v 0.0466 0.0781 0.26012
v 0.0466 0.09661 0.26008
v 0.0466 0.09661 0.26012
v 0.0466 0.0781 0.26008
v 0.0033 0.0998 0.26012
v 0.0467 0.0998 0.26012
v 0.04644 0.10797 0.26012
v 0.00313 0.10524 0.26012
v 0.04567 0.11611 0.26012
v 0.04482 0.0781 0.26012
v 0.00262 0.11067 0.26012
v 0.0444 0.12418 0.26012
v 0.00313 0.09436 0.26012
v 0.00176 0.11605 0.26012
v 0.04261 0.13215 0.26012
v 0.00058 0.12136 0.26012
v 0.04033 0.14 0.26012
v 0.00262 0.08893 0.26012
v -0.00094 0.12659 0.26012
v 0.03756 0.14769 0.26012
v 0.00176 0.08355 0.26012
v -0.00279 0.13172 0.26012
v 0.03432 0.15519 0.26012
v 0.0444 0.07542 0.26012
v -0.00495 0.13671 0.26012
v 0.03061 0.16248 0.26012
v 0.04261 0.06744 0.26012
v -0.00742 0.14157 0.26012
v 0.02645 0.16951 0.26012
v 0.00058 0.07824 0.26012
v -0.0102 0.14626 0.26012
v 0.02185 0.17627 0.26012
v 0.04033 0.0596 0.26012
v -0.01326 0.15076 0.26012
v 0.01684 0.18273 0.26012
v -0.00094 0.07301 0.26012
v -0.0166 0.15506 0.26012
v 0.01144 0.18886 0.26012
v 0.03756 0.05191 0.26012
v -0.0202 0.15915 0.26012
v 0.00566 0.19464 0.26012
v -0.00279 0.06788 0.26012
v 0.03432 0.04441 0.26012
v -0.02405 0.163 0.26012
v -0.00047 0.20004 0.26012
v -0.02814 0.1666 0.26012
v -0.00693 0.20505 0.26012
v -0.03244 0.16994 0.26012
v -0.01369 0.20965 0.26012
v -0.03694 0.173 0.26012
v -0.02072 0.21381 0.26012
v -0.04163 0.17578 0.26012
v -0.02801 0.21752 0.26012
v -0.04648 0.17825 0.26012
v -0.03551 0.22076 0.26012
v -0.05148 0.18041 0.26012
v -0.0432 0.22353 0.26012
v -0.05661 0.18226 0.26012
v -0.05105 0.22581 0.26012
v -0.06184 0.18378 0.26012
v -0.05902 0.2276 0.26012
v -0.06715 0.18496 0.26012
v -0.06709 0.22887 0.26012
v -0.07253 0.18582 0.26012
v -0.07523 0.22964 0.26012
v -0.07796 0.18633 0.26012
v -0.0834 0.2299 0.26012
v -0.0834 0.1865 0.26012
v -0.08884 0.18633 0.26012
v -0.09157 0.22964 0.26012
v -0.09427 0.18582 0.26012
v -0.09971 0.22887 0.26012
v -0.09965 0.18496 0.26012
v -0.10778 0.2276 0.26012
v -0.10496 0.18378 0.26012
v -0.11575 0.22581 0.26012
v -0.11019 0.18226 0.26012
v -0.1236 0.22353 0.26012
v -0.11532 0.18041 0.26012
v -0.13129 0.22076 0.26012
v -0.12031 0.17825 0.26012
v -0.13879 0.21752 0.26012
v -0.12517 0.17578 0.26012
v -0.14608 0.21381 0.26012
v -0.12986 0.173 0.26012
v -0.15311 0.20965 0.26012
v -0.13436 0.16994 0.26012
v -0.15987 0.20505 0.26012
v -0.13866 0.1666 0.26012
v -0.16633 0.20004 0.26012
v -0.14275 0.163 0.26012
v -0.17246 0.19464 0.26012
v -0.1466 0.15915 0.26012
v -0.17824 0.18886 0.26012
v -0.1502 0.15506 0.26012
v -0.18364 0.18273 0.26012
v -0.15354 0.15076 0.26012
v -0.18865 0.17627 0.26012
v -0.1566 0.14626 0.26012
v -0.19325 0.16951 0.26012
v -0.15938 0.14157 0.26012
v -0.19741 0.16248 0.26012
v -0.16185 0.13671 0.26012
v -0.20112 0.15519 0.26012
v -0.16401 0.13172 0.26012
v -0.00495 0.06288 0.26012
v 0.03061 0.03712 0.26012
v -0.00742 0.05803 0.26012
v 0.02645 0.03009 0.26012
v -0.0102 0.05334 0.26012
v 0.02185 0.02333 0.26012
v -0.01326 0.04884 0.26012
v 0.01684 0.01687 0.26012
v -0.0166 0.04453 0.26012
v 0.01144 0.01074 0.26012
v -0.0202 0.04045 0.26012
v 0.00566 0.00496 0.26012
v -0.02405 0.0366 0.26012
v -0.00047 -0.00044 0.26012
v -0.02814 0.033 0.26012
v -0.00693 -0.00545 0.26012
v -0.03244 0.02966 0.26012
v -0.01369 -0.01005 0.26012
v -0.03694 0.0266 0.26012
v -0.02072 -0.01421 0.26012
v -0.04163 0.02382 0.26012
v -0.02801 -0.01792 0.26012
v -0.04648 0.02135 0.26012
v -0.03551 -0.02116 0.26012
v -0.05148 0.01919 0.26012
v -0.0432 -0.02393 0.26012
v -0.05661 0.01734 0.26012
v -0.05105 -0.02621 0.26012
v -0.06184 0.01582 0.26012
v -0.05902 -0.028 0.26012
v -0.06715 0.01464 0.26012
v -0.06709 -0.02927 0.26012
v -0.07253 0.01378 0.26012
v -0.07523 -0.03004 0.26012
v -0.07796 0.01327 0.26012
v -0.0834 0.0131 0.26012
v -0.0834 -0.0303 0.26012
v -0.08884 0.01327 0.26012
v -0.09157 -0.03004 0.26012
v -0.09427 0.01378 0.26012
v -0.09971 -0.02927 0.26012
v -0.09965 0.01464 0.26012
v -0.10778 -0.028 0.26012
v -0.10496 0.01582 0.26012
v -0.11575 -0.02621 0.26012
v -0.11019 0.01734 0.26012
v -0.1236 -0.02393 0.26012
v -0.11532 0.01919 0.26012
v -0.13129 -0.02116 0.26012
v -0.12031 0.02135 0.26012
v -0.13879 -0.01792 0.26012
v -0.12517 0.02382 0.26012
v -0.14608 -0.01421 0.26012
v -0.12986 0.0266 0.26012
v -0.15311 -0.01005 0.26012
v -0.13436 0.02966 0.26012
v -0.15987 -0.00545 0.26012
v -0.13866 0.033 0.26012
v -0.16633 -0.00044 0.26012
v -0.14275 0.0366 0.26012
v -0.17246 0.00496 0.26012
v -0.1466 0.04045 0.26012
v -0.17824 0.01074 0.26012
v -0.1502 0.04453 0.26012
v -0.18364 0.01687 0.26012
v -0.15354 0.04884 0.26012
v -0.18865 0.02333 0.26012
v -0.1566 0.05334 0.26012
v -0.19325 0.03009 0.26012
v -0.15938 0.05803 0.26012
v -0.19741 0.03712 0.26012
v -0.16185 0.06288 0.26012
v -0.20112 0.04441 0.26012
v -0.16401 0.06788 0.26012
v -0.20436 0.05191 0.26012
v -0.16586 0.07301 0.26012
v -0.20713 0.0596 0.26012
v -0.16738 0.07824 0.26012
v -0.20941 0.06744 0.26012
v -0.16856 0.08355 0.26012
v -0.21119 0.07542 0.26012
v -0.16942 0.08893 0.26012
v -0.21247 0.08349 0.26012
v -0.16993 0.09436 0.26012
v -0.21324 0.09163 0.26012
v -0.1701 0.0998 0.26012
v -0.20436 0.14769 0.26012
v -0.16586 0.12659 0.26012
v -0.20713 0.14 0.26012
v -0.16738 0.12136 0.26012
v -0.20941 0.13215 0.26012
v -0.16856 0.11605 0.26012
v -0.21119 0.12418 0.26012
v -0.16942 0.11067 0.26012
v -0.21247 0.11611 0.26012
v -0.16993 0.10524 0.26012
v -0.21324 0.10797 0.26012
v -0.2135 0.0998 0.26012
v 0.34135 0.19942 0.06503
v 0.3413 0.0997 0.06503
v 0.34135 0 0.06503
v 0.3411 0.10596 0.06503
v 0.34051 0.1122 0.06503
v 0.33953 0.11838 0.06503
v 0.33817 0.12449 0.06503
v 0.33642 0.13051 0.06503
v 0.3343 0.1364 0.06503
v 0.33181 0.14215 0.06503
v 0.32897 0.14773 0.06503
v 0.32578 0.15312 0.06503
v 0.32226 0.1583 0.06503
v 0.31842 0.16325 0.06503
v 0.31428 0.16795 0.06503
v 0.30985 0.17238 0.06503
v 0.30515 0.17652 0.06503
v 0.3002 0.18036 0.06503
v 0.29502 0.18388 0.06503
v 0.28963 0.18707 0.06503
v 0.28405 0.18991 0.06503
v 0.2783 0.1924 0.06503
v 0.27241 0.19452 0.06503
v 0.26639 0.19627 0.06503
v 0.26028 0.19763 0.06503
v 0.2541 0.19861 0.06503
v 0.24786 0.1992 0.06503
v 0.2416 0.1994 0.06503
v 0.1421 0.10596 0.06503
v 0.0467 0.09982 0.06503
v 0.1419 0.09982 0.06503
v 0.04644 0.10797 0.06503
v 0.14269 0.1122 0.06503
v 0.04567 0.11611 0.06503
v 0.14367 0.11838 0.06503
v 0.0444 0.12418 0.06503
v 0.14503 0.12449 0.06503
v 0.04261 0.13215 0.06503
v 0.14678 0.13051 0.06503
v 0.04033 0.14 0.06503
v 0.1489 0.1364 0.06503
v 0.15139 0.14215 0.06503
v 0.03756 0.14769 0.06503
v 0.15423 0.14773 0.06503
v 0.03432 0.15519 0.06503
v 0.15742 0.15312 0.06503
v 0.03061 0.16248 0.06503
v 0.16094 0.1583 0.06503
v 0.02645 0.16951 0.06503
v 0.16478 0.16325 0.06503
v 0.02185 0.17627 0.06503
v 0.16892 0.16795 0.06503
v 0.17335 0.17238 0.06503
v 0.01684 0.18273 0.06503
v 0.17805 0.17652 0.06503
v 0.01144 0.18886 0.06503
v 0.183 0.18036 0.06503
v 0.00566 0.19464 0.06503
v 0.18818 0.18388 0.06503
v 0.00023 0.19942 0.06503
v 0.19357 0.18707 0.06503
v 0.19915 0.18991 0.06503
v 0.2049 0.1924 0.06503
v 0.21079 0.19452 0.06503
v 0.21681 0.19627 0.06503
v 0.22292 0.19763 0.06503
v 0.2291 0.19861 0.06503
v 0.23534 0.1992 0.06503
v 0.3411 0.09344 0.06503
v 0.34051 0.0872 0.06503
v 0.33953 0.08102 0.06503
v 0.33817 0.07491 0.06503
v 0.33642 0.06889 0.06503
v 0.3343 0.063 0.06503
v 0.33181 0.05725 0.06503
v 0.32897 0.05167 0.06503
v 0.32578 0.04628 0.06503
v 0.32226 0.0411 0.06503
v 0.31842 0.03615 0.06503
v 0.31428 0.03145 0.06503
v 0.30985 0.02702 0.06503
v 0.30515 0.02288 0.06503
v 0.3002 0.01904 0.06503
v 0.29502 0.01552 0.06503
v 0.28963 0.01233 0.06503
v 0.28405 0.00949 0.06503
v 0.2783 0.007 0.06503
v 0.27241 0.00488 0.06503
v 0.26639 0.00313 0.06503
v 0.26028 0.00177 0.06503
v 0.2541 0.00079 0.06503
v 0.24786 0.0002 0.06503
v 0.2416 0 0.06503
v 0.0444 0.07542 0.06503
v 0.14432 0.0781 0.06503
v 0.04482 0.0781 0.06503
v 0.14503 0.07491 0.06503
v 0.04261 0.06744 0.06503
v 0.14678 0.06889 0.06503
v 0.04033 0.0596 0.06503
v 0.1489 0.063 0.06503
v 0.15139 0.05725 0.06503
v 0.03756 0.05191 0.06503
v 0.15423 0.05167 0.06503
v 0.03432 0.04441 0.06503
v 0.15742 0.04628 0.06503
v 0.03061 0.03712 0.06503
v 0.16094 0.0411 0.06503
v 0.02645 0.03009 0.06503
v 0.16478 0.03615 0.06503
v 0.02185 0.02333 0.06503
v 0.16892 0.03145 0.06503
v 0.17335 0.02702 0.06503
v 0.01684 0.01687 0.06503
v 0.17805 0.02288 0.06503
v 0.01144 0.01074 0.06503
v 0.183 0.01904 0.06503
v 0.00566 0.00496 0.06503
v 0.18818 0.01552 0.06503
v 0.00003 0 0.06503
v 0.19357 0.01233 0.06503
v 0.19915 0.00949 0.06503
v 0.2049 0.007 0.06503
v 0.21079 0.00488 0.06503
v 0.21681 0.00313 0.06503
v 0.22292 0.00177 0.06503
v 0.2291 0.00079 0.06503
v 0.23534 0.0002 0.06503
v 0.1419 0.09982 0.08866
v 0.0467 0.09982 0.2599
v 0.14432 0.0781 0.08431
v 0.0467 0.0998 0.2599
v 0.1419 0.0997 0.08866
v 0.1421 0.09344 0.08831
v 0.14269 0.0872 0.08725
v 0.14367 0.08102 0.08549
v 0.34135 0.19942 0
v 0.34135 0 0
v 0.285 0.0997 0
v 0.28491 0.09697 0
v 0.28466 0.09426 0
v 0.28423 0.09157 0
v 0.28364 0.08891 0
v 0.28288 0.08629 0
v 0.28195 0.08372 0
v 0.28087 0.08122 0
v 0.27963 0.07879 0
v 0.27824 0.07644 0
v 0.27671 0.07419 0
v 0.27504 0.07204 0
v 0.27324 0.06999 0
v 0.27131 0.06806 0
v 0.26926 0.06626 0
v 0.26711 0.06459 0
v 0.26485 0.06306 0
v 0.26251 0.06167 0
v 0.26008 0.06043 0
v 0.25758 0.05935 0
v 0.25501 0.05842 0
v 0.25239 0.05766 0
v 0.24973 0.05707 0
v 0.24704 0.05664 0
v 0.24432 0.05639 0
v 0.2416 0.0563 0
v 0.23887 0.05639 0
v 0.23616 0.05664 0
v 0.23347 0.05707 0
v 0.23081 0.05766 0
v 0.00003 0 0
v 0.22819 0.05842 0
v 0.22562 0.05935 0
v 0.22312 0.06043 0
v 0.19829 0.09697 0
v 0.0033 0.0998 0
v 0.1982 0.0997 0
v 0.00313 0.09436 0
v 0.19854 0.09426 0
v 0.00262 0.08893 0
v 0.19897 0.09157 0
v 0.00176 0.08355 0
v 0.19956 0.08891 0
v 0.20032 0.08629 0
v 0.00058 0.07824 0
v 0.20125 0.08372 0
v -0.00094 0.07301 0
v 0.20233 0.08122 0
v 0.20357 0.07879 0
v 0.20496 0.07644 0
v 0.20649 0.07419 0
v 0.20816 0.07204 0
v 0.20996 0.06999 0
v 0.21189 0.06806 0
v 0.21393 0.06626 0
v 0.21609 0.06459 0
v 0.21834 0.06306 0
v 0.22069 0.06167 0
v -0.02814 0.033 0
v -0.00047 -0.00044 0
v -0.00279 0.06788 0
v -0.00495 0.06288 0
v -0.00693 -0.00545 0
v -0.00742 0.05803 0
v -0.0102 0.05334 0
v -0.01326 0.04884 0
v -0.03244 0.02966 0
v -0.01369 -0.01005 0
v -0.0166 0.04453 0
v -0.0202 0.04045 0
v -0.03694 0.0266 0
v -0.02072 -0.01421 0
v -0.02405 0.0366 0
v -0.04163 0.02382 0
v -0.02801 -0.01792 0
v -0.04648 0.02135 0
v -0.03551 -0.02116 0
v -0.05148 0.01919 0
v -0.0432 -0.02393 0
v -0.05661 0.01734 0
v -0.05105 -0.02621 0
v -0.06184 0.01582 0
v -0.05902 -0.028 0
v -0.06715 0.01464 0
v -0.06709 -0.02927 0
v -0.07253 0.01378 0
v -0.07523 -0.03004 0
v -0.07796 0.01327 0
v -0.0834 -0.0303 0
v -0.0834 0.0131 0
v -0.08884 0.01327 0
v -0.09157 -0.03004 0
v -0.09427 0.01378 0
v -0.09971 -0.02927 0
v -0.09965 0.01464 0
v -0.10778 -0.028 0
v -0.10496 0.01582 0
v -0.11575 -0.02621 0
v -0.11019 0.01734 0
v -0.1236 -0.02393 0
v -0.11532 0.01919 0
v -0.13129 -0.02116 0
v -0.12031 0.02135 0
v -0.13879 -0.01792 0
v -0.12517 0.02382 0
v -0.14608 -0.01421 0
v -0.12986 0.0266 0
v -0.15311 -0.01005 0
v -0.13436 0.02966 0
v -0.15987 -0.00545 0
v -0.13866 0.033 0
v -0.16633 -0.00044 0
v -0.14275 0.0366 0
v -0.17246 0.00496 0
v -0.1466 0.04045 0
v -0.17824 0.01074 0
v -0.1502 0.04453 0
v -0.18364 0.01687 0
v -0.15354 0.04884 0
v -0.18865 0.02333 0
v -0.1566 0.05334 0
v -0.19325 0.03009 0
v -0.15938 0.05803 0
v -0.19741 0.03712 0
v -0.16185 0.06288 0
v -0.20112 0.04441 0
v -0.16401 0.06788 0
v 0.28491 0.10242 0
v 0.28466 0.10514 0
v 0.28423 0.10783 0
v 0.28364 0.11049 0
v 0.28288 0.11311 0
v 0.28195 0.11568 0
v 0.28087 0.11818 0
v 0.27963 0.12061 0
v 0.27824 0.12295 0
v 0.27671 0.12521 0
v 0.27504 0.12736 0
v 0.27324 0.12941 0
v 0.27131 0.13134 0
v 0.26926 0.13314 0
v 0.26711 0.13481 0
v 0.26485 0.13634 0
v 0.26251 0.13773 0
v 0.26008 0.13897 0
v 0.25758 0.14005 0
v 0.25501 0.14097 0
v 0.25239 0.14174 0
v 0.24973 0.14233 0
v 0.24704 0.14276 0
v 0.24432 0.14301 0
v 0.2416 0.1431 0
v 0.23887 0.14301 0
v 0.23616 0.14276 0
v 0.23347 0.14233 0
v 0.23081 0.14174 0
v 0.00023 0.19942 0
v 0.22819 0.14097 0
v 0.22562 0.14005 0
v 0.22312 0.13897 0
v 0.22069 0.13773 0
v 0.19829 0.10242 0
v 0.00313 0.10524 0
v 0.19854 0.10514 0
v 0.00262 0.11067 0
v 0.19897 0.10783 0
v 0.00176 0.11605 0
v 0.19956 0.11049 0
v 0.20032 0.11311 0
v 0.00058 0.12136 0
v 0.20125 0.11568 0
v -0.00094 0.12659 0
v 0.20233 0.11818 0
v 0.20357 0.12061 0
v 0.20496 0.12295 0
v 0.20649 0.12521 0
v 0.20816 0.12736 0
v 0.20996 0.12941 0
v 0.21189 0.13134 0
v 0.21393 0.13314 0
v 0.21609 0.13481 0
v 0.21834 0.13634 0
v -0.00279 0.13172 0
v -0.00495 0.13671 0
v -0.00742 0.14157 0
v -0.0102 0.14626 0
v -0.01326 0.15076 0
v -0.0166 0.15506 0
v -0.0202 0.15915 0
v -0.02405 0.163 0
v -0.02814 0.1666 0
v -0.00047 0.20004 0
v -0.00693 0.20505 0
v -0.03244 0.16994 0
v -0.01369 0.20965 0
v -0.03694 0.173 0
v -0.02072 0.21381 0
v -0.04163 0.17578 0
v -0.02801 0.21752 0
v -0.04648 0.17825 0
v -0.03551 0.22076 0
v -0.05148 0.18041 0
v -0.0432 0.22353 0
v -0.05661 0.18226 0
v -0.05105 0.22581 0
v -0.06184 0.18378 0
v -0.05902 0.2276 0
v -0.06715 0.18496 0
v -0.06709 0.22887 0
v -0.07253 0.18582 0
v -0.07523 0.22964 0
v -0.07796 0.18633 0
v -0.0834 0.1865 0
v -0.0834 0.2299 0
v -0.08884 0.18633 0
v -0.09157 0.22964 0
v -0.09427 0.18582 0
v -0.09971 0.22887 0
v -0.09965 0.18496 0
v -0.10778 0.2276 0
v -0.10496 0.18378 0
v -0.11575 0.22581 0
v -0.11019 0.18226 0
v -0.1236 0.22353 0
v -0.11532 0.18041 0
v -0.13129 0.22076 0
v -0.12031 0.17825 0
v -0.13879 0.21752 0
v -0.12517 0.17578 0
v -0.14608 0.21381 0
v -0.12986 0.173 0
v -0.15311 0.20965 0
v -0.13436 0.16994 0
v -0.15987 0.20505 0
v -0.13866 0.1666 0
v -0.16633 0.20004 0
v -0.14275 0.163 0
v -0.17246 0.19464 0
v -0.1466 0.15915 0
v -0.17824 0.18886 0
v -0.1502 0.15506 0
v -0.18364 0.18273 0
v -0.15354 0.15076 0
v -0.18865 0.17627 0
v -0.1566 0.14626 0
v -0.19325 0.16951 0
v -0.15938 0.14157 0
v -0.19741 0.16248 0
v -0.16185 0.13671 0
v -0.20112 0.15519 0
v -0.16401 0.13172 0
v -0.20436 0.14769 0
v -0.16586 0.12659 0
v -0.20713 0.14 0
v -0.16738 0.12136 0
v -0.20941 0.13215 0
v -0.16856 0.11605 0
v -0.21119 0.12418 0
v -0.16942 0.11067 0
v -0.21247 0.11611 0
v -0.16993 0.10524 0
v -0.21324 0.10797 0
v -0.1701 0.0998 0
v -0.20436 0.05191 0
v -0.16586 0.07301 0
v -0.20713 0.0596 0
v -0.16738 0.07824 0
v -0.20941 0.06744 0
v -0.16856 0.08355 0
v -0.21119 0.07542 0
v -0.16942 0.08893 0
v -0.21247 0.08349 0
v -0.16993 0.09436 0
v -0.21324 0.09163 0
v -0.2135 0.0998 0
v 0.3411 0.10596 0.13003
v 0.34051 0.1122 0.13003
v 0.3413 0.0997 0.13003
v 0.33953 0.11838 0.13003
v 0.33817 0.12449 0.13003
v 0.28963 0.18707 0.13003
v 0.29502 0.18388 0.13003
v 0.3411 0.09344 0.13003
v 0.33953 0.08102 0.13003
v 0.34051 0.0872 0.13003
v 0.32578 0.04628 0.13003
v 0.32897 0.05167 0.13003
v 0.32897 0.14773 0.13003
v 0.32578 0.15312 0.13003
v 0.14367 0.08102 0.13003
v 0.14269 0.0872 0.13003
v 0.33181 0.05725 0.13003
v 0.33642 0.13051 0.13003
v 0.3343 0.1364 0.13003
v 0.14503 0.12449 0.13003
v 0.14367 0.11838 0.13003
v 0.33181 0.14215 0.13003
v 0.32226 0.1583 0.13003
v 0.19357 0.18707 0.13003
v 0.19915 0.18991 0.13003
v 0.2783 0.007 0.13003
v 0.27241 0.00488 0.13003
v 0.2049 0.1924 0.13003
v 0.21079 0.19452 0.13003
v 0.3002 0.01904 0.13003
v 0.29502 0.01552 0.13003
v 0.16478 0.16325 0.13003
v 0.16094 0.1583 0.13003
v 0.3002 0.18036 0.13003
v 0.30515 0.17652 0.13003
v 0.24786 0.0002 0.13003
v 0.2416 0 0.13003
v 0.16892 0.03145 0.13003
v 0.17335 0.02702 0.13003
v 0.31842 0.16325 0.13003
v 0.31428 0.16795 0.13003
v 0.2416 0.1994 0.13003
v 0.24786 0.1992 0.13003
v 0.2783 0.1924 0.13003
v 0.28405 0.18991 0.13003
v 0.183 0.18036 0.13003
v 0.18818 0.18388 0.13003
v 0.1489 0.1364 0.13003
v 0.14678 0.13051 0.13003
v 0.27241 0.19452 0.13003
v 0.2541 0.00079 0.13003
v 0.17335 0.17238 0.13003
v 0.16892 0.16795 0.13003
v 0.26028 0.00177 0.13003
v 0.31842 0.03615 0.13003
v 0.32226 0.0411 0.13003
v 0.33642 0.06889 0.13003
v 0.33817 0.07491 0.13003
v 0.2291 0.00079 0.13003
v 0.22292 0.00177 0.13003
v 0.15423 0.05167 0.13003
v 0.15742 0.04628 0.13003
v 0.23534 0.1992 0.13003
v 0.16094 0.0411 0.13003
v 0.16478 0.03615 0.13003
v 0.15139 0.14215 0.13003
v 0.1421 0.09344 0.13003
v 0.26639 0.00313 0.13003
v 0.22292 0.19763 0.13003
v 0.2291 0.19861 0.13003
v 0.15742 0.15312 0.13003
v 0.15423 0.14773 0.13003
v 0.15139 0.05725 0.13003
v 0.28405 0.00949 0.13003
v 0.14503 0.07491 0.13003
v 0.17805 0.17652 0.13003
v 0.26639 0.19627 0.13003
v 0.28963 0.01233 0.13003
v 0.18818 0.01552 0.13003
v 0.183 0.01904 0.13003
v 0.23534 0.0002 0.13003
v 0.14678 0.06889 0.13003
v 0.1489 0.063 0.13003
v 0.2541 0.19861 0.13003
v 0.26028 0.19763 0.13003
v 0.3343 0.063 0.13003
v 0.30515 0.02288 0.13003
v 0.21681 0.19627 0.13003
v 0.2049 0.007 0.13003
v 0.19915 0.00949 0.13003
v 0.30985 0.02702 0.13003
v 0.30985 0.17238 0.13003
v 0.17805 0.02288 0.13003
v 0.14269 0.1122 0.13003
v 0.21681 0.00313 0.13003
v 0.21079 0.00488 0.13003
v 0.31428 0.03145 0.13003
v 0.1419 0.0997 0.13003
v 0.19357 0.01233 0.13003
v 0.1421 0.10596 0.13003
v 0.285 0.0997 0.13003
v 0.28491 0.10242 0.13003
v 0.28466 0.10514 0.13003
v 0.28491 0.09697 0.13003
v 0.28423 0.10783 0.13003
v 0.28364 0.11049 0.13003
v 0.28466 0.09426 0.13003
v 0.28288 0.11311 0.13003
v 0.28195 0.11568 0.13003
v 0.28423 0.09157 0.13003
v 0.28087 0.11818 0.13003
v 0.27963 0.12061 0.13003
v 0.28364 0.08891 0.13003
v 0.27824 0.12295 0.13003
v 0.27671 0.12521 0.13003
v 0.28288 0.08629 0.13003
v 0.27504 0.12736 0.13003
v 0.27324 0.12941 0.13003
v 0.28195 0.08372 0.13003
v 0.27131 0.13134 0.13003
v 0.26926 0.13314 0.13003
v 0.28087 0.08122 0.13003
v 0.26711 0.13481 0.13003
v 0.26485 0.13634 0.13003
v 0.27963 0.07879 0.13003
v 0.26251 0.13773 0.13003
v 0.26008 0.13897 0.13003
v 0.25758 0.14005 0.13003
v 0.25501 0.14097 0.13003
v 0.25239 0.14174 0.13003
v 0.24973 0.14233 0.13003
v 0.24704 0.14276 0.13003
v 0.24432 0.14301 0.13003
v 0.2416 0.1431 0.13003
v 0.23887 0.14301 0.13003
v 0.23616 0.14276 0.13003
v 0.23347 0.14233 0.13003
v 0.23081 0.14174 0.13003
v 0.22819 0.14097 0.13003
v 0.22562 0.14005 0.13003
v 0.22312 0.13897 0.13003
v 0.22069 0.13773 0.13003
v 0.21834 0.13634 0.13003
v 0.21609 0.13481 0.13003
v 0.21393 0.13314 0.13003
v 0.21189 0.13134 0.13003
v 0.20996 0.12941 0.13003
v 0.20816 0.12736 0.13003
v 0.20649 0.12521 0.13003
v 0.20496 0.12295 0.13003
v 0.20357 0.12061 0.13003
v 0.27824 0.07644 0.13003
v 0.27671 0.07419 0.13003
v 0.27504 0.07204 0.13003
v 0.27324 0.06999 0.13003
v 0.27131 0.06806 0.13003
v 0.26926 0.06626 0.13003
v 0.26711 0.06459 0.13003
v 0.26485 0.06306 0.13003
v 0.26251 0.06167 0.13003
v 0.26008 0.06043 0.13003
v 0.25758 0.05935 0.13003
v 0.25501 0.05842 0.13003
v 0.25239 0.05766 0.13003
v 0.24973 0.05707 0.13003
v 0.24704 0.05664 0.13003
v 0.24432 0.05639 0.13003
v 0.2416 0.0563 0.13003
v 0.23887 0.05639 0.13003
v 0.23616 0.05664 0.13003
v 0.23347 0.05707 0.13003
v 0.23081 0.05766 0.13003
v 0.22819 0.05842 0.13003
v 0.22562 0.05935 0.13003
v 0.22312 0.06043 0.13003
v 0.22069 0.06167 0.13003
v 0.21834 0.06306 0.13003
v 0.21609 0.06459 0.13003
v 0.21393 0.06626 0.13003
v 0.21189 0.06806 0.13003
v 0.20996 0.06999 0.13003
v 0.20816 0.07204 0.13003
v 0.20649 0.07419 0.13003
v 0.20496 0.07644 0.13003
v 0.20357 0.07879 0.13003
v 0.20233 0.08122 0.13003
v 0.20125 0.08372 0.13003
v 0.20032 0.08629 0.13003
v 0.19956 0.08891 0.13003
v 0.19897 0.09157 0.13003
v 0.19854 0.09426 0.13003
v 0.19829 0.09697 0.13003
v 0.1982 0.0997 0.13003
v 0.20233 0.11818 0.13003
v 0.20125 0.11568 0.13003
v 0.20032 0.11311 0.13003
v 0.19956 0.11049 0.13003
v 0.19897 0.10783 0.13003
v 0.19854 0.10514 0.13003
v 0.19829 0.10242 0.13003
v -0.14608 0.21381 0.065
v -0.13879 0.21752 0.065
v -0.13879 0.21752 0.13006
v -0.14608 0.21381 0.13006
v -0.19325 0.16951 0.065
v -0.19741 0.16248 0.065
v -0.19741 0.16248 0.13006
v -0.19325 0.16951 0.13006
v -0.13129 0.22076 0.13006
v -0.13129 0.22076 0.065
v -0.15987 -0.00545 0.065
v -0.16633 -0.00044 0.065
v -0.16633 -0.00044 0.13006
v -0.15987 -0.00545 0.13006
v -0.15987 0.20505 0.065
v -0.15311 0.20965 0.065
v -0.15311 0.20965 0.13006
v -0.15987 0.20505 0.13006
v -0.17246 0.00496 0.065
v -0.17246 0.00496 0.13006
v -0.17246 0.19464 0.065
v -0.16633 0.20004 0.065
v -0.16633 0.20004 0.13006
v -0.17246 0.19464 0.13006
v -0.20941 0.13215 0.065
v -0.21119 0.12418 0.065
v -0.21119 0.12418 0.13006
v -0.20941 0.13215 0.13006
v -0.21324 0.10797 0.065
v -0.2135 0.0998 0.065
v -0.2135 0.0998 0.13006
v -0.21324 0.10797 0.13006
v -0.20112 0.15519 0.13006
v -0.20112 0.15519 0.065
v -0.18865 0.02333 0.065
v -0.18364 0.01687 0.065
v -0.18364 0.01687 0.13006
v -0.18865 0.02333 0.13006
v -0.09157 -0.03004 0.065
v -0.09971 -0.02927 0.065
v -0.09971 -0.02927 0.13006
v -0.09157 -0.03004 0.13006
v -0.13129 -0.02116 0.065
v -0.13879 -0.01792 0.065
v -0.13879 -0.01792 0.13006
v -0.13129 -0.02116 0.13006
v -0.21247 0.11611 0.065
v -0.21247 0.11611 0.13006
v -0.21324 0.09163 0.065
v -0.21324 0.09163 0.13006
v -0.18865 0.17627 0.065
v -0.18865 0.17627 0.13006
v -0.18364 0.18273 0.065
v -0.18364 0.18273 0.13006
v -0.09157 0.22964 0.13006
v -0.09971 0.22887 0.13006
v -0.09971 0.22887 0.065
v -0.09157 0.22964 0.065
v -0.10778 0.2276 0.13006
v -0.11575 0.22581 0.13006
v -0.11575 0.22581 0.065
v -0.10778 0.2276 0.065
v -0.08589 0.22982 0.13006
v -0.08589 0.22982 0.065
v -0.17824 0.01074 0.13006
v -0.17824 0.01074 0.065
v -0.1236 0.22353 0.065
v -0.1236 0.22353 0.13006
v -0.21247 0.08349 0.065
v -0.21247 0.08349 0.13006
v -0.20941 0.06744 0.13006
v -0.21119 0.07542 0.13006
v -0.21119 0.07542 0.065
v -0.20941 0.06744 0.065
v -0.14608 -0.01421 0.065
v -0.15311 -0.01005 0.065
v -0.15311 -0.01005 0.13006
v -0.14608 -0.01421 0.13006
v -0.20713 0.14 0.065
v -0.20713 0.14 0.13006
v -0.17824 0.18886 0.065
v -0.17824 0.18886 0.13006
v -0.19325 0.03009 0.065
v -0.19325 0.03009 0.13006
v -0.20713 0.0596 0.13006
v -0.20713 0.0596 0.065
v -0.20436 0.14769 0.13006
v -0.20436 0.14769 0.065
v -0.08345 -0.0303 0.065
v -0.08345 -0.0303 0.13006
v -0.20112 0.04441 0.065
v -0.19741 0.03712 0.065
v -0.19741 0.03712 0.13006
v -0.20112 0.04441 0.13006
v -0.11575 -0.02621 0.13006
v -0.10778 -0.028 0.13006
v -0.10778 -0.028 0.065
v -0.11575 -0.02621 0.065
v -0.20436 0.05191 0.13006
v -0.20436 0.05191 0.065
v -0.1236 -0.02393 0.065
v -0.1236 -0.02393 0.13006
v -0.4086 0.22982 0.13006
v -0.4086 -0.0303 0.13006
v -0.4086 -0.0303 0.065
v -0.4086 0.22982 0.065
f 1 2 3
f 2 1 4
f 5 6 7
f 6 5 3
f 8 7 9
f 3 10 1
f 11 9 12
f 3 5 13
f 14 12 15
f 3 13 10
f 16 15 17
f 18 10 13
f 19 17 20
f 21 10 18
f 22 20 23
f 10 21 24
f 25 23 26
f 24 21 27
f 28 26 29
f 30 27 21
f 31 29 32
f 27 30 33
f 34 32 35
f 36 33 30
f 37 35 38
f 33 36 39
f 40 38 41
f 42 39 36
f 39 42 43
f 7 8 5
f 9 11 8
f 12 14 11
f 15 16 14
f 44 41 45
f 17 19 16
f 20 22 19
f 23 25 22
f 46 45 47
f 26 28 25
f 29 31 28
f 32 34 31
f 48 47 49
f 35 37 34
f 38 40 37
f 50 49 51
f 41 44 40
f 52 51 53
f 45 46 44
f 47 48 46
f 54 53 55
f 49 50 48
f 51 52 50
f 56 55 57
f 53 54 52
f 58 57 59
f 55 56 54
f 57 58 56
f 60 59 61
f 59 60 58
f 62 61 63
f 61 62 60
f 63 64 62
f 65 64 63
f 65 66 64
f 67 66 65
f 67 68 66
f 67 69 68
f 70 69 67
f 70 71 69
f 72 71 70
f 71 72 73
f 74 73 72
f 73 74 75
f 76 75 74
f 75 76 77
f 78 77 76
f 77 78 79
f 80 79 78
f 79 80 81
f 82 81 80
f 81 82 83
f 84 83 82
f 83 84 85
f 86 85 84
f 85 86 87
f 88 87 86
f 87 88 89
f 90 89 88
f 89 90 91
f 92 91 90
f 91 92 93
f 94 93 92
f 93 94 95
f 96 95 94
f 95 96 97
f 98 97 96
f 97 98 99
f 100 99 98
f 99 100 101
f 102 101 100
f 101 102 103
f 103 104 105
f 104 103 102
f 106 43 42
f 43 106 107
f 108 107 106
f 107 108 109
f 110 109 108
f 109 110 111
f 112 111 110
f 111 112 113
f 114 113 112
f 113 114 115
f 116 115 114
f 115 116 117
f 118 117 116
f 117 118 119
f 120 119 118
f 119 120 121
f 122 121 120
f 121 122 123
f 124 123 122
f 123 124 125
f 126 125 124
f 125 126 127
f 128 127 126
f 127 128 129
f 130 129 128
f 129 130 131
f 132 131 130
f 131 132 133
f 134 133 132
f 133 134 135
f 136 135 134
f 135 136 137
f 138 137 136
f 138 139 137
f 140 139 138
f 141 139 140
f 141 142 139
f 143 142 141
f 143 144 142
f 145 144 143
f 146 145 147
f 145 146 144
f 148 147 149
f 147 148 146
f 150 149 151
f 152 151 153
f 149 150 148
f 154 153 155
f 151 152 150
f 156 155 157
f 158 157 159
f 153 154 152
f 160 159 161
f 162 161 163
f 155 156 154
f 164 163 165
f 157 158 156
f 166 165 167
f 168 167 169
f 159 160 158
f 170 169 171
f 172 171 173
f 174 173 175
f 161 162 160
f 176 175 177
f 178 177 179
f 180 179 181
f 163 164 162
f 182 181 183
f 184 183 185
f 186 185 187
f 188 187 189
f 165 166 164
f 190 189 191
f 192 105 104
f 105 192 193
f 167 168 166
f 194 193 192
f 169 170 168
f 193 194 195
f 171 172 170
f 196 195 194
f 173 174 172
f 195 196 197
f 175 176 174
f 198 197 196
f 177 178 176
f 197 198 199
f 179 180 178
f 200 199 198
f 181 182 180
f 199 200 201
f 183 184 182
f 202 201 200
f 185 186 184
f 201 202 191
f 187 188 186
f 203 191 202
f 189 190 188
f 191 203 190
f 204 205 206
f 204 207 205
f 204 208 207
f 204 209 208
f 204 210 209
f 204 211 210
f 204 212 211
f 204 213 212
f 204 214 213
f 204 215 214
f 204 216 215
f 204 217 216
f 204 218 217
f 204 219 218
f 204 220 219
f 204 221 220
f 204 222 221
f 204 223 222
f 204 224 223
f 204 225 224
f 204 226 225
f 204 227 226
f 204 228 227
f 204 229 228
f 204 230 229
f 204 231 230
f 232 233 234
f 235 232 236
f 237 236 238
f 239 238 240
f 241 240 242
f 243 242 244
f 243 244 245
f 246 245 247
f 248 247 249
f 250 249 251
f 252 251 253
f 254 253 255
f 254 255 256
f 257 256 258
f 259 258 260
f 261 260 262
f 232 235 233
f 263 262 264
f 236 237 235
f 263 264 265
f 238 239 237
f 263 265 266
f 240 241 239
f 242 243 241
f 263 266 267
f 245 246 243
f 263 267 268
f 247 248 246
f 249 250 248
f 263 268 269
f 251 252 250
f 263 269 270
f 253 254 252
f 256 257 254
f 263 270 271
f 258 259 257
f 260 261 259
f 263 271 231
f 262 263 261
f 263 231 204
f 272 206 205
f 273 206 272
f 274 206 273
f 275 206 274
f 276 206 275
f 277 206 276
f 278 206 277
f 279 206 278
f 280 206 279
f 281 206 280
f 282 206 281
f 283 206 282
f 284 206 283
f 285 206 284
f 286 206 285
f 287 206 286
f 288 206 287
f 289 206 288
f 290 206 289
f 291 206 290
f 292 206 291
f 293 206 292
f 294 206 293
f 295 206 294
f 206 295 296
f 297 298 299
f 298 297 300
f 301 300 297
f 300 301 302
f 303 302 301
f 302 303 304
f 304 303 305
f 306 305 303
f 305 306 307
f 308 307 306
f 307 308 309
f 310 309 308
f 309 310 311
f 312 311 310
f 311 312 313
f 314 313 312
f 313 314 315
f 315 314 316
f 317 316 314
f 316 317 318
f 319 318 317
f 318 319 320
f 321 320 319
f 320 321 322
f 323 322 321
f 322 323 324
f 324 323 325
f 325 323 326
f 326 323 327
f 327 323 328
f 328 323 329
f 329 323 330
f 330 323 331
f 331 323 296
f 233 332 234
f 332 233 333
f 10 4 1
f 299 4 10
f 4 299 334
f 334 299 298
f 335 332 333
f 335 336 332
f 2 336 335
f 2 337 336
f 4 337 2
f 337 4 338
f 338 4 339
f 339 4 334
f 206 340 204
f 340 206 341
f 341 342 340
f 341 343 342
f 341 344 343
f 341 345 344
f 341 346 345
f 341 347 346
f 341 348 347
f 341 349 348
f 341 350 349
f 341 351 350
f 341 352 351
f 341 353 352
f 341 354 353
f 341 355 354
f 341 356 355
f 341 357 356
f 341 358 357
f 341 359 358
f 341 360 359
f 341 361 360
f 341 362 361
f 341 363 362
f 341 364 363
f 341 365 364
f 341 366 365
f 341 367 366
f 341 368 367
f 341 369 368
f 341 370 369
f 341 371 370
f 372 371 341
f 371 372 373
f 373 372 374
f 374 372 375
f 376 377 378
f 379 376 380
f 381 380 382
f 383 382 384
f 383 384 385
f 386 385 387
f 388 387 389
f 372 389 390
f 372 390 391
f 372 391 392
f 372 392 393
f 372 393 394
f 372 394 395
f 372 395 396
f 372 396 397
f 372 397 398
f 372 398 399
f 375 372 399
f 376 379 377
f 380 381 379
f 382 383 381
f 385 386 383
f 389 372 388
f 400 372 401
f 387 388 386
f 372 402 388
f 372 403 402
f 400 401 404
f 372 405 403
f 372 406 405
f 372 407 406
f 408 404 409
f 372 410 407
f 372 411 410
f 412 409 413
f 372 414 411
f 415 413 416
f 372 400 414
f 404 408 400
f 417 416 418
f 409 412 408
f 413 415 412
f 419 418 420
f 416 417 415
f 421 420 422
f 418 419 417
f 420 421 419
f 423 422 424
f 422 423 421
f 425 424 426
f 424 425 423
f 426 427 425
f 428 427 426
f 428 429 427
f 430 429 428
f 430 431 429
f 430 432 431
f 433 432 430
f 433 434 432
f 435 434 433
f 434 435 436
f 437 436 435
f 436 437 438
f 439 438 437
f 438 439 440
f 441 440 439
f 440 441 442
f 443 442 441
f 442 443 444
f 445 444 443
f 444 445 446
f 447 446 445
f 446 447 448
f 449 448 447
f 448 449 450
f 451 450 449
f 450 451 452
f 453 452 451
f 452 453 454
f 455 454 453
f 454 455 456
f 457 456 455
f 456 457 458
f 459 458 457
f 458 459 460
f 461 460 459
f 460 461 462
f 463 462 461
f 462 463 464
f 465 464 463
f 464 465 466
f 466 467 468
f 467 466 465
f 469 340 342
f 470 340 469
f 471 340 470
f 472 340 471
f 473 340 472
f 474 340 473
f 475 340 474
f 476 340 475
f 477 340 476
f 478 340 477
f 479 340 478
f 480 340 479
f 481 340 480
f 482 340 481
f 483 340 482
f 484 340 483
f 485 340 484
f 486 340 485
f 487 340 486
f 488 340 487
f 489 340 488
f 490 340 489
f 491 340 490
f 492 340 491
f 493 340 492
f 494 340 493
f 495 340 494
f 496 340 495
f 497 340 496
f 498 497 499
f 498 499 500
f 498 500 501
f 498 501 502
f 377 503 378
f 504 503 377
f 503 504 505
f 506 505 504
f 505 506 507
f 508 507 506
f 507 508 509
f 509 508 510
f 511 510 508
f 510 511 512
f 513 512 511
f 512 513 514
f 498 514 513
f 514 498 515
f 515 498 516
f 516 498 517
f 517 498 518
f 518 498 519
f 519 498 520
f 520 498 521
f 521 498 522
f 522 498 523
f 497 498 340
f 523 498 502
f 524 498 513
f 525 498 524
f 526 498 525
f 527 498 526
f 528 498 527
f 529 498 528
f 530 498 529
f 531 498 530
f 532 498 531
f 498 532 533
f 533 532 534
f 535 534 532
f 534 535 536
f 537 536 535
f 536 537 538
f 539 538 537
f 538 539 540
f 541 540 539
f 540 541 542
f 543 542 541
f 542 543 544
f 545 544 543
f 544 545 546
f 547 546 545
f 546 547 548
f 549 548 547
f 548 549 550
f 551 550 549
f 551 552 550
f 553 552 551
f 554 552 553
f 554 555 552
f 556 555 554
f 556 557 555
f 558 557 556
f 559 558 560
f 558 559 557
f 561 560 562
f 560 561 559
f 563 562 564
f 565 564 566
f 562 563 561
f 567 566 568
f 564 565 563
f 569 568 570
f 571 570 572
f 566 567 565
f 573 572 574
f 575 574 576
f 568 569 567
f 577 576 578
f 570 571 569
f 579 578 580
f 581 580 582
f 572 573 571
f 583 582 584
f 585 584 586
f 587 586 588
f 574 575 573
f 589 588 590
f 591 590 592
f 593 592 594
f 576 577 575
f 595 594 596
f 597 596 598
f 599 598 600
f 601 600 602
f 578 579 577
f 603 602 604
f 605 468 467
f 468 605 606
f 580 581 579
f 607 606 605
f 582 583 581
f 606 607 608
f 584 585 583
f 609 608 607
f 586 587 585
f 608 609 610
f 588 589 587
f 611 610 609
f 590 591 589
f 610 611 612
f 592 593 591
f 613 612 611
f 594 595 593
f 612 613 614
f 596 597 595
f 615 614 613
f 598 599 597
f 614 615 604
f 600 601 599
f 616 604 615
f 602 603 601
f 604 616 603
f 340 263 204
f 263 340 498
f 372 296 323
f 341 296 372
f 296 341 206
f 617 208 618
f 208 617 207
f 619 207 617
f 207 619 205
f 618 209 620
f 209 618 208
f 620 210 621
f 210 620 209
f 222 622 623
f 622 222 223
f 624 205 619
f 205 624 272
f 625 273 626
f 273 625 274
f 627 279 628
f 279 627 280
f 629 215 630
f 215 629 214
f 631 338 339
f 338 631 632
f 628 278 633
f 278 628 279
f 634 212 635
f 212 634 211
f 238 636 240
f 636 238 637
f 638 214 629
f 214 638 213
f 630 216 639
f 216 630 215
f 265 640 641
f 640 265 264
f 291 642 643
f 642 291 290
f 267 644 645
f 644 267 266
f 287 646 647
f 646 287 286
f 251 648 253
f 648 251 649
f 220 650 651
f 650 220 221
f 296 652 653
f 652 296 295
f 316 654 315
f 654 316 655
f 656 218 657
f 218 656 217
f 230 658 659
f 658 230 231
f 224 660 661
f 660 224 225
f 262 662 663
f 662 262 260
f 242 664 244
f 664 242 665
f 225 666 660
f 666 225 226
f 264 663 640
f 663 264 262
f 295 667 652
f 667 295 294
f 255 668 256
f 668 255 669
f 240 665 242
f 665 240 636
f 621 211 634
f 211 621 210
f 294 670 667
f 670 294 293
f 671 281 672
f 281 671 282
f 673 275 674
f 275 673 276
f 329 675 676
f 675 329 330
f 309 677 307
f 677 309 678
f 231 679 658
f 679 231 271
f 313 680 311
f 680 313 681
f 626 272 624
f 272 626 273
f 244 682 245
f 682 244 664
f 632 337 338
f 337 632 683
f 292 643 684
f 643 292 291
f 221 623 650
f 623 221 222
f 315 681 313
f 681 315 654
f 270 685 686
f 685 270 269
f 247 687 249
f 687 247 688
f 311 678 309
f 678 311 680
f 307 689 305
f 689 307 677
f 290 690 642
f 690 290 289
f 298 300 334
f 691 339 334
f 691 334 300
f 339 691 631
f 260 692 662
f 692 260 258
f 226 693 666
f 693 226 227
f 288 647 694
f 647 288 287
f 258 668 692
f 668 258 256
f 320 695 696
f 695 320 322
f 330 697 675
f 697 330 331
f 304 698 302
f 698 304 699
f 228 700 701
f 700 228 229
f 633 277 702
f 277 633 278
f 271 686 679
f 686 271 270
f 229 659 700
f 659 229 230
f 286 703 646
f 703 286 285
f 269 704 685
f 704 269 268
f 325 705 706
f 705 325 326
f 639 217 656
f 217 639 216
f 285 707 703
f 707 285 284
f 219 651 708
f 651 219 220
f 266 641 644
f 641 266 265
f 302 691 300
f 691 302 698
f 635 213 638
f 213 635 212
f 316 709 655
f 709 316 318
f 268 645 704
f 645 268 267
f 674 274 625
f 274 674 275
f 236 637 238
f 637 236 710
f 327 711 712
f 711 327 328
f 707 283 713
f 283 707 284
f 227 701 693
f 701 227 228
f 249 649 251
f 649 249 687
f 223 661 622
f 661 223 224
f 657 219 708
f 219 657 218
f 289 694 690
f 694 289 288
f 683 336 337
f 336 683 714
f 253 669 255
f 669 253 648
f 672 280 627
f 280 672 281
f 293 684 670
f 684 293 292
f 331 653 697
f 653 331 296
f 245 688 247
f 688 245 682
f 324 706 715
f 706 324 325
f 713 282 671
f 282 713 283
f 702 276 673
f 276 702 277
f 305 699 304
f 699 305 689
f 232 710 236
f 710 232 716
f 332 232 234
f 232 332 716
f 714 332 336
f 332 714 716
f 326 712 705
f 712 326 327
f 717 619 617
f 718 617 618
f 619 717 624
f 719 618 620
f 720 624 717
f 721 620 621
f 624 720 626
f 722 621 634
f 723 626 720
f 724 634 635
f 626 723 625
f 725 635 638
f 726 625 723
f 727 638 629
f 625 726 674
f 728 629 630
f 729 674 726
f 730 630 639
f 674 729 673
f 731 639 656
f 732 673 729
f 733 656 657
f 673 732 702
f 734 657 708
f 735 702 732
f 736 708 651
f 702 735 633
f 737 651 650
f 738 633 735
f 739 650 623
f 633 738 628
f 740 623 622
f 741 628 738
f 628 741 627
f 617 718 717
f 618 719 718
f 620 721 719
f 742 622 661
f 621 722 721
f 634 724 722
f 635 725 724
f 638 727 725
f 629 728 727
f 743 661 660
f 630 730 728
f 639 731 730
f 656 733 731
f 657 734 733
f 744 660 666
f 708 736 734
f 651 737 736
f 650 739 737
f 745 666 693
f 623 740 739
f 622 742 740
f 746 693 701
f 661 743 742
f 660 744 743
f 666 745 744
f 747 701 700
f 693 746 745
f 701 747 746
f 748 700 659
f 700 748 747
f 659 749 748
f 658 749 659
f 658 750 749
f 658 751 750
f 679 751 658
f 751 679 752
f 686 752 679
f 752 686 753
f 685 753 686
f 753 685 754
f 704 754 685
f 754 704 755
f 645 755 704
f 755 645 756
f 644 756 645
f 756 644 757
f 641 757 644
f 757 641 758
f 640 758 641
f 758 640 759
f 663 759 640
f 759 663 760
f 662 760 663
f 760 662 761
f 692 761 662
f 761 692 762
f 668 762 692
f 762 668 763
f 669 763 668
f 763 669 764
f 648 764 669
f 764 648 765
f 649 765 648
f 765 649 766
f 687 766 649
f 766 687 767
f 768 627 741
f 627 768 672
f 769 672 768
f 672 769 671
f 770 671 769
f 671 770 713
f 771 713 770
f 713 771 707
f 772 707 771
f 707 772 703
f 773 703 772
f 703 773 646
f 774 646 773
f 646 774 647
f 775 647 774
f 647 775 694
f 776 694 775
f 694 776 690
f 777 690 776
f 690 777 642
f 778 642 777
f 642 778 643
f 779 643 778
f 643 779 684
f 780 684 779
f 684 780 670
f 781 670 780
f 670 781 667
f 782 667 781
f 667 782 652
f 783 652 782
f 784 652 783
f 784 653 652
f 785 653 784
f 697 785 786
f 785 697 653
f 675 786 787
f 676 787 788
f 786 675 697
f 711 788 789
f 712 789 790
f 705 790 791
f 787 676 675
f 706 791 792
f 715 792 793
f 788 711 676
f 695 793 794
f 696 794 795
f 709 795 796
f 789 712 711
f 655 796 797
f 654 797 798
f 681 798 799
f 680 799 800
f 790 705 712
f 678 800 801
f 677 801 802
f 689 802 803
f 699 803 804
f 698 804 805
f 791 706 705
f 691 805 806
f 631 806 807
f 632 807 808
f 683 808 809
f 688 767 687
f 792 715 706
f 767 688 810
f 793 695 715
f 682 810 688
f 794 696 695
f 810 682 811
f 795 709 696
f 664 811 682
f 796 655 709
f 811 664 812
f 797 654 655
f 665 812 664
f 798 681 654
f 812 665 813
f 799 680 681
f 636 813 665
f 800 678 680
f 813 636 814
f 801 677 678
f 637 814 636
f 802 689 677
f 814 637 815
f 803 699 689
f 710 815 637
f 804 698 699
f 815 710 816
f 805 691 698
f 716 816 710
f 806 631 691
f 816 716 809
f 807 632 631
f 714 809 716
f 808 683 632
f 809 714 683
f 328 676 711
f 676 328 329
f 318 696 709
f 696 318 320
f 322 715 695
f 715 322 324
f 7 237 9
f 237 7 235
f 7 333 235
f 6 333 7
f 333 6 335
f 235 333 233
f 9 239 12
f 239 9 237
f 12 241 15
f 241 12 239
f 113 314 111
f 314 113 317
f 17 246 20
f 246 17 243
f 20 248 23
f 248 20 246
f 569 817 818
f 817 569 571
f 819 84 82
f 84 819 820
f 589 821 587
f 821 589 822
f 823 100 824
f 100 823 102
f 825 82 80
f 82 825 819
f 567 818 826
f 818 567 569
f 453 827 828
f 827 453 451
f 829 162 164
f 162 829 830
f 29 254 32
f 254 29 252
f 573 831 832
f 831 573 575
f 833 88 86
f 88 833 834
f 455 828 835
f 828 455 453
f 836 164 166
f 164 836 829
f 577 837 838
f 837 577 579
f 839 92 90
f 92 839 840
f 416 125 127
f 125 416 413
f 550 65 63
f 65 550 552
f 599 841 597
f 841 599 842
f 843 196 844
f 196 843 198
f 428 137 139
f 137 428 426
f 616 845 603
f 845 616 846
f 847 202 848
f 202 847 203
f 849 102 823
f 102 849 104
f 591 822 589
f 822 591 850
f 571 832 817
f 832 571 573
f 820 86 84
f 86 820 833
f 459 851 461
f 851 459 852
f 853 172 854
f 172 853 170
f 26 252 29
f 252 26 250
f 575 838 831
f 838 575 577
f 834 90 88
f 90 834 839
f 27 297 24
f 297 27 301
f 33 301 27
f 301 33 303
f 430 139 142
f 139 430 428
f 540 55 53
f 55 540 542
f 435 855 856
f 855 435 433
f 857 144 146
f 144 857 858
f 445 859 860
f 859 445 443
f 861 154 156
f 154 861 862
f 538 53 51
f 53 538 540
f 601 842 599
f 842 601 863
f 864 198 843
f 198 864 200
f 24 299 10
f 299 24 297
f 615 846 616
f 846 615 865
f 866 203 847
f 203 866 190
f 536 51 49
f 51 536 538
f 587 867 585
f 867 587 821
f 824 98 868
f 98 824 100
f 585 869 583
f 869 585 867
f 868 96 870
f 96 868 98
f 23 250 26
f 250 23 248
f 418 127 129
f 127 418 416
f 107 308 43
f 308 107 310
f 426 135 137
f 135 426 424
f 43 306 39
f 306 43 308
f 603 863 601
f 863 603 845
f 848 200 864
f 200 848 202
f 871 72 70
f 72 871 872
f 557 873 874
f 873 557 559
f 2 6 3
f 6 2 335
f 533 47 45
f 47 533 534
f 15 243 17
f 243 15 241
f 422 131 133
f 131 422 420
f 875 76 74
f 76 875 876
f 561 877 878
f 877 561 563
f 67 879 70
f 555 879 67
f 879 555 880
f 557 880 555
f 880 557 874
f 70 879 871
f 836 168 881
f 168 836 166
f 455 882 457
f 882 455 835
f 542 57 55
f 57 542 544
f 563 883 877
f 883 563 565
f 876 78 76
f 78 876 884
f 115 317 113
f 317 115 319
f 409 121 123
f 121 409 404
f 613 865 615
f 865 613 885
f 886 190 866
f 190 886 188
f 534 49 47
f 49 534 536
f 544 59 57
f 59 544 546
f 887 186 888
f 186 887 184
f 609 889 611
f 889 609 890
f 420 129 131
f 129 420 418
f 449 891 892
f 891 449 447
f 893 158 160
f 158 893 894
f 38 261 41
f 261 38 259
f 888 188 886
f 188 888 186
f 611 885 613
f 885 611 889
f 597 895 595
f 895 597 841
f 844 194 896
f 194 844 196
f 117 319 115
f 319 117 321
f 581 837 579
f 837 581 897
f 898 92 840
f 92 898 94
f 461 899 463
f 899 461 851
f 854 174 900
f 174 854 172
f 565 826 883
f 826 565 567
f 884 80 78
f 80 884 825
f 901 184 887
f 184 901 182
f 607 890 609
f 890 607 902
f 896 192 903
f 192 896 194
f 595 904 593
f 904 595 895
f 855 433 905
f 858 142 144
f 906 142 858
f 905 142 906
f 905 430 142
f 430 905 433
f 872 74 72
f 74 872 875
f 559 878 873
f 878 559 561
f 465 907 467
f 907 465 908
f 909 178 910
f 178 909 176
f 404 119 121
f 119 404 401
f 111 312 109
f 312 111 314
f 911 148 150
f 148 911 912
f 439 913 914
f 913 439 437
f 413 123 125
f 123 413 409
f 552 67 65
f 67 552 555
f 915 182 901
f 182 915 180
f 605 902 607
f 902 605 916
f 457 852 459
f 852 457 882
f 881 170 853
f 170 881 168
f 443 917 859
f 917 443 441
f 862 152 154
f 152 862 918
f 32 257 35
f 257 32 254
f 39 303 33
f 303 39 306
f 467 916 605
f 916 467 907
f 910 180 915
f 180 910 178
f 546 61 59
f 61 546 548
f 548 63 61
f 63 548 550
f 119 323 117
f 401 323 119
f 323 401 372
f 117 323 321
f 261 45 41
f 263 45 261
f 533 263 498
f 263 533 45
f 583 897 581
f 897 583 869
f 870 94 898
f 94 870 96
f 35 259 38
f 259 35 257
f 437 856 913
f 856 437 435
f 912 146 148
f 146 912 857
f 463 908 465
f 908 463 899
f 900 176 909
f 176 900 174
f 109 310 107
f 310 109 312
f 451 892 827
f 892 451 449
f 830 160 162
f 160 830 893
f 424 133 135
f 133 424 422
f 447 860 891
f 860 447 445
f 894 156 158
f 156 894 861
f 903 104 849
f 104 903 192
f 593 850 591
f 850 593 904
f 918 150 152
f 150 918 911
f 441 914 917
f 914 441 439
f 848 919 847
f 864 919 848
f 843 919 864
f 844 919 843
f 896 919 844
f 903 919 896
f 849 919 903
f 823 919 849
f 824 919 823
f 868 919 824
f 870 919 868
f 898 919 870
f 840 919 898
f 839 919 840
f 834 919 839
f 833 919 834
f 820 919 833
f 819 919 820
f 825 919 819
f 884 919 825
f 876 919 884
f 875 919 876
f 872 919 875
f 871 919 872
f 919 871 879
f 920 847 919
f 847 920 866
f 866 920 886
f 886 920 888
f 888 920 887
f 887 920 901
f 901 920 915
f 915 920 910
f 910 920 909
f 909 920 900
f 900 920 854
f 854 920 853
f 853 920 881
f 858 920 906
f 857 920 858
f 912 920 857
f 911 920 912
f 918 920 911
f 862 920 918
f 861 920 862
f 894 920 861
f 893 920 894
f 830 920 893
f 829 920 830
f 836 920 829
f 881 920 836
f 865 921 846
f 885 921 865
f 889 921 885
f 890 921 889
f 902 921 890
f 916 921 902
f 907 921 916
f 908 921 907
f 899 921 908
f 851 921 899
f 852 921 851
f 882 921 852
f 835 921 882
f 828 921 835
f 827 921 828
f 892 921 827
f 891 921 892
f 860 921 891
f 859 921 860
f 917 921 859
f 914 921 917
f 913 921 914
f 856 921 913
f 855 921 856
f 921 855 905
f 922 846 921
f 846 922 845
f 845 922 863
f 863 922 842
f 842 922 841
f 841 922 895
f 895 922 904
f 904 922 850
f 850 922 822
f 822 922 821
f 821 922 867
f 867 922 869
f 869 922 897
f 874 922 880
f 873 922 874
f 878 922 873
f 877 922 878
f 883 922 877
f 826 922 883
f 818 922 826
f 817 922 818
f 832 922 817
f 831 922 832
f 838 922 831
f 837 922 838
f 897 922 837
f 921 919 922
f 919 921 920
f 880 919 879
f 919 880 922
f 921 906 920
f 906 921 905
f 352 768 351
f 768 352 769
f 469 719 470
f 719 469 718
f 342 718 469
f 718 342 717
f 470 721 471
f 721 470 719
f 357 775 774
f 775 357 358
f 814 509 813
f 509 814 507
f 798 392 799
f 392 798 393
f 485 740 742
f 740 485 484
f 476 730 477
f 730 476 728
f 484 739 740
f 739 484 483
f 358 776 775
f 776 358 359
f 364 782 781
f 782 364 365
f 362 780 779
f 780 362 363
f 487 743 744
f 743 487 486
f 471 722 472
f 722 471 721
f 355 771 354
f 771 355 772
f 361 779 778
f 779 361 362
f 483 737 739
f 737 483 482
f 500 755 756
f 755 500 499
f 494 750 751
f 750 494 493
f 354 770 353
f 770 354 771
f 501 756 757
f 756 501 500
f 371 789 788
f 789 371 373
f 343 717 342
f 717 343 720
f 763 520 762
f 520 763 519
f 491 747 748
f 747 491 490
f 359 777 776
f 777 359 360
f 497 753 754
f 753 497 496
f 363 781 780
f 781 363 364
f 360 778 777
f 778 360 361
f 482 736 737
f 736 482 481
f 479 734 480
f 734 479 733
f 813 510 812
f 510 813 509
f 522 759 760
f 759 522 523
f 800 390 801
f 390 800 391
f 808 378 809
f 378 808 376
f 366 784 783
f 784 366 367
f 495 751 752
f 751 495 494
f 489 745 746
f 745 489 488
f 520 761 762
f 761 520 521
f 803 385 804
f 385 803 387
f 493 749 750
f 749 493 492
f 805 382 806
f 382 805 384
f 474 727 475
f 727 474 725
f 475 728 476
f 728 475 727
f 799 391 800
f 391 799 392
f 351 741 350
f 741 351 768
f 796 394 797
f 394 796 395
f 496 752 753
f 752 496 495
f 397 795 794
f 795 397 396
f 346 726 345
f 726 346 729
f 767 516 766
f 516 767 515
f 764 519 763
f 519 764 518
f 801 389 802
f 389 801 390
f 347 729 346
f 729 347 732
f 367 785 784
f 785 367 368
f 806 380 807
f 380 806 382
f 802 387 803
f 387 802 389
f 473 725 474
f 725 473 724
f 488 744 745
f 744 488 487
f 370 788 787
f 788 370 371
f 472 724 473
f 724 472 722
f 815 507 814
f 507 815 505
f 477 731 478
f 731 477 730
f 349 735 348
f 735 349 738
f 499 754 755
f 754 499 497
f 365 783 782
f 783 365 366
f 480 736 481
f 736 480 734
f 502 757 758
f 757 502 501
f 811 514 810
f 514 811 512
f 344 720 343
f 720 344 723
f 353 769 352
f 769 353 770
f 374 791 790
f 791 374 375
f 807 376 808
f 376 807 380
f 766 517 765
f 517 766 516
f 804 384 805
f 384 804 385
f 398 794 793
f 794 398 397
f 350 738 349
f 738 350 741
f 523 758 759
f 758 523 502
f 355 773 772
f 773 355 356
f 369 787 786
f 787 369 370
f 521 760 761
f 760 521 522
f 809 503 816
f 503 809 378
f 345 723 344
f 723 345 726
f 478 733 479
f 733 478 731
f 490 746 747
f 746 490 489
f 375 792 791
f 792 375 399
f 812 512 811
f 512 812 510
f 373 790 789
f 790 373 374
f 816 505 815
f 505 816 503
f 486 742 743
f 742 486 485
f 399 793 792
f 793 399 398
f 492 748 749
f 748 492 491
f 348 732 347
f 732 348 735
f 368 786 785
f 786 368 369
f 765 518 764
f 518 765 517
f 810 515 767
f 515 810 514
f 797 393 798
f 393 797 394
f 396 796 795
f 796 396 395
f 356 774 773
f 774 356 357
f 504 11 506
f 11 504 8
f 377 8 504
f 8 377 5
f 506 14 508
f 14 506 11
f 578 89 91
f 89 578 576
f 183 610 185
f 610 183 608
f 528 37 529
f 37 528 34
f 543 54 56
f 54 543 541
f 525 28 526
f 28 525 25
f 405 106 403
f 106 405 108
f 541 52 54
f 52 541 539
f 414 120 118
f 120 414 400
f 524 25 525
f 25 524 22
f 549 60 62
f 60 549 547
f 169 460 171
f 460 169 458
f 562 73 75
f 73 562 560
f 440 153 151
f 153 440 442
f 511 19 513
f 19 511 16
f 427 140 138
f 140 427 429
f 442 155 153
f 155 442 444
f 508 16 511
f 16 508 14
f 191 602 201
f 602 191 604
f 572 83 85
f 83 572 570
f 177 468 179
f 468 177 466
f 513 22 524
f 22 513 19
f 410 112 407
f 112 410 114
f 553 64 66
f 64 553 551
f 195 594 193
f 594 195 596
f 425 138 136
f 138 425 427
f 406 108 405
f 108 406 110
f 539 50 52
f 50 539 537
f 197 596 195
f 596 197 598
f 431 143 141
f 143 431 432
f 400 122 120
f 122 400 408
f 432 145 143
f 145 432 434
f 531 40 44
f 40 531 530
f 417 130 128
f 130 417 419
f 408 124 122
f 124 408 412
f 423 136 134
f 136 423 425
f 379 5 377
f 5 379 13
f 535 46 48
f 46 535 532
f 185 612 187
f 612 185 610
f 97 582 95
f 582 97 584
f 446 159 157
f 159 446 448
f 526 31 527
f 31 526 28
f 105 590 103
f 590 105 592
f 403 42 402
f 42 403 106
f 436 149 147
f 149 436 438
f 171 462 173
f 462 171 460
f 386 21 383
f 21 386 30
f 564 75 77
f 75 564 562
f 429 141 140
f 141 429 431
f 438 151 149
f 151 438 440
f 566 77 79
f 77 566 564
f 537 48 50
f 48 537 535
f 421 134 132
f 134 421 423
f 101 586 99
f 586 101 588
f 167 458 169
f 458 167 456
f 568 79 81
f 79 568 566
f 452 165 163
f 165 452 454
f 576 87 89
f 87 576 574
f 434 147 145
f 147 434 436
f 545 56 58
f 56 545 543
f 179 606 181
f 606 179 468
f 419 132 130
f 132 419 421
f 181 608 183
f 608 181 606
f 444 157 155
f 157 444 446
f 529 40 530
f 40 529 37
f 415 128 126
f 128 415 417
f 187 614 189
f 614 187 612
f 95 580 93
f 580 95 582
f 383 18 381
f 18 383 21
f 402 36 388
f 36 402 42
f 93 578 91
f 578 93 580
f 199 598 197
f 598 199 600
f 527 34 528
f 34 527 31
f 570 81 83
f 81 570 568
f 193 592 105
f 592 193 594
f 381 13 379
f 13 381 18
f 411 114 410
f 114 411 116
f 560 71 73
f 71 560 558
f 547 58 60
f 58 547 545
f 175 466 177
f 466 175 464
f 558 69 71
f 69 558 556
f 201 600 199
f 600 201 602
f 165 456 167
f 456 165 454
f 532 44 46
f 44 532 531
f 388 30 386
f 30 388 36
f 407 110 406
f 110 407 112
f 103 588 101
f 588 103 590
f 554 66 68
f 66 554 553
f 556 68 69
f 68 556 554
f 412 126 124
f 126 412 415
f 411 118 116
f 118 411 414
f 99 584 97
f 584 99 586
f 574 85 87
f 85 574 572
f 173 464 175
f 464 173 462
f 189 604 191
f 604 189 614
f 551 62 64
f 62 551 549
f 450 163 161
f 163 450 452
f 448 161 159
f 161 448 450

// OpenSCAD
// ---------------------------------------------------------------------------
// Bracket: base plate + low annular ring boss + tall hollow sleeve
//          + stepped arm tier + triangular web
// All dimensions in millimeters. Origin at base left-front-bottom corner.
// ---------------------------------------------------------------------------
$fn = 100;
eps = 0.001;

// --- Base plate ---
base_length = 0.341352;   // X extent
base_width  = 0.199422;   // Y extent
base_height = 0.065029;   // Z extent

// --- Low annular ring boss on top of base ---
ring_cx        = 0.2416;  // center X from base left edge
ring_cy        = 0.0997;  // center Y from base front edge
ring_r_outer   = 0.0997;
ring_r_inner   = 0.0434;  // open through-profile radius
ring_thickness = 0.065;   // main extrusion depth

// --- Tall hollow sleeve (concentric annular cylinder) ---
sleeve_cx      = -0.0834;  // center X from base left edge (overhangs left)
sleeve_cy      = 0.0998;   // center Y from base front edge
sleeve_r_outer = 0.1301;
sleeve_r_inner = 0.0867;   // bore radius
sleeve_top     = 0.260116; // upward reach from base datum (Z = 0)

// --- Stepped arm tier (lower band 0..0.065 cut away from underside) ---
arm_x0     = -0.4086;               // left edge, base left reference
arm_x1     = base_length - 0.4248;  // right edge, base right reference
arm_y0     = -0.0303;               // front edge, base front reference
arm_y1     = base_width + 0.0304;   // back edge, base back reference
arm_bottom = 0.065;                 // underside band removed (0 to 0.065)
arm_top    = 0.130058;              // top of raised tier

// --- Triangular web on upper side ---
web_x0       = 0.0466;              // left end, base left reference
web_x1       = base_length - 0.1863;// right end, base right reference
web_y0       = 0.0781;              // front face, base front reference
web_y1       = base_width - 0.0996; // back face, base back reference
web_base     = base_height;         // rests on base top
web_top      = sleeve_top;          // rises to the 0.2601 sleeve tier
web_strap_x  = 0.030;               // strap depth into sleeve wall (robust union)

// --- Modules ---
module base_plate() {
    cube([base_length, base_width, base_height]);
}

module ring_boss() {
    // Solid boss; the inner opening is cut later at assembly level
    translate([ring_cx, ring_cy, base_height])
        cylinder(h = ring_thickness, r = ring_r_outer);
}

module sleeve_outer() {
    // Full-height outer cylinder from base datum up to the sleeve tier
    translate([sleeve_cx, sleeve_cy, 0])
        cylinder(h = sleeve_top, r = sleeve_r_outer);
}

module arm_tier() {
    // Raised tier only (lower band already removed)
    translate([arm_x0, arm_y0, arm_bottom])
        cube([arm_x1 - arm_x0, arm_y1 - arm_y0, arm_top - arm_bottom]);
}

module web() {
    // Vertical strap merging the web into the sleeve wall
    translate([web_strap_x, web_y0, web_base])
        cube([web_x0 - web_strap_x, web_y1 - web_y0, web_top - web_base]);
    // Triangular side profile in XZ, extruded across the web thickness in Y
    translate([0, web_y1, 0])
        rotate([90, 0, 0])
            linear_extrude(height = web_y1 - web_y0)
                polygon([[web_x0, web_base],
                         [web_x0, web_top],
                         [web_x1, web_base]]);
}

// --- Assembly ---
difference() {
    union() {
        base_plate();
        ring_boss();
        sleeve_outer();
        arm_tier();
        web();
    }
    // Ring inner profile open through ring and base
    translate([ring_cx, ring_cy, -eps])
        cylinder(h = base_height + ring_thickness + 2*eps, r = ring_r_inner);
    // Sleeve bore open through full height
    translate([sleeve_cx, sleeve_cy, -eps])
        cylinder(h = sleeve_top + 2*eps, r = sleeve_r_inner);
}
